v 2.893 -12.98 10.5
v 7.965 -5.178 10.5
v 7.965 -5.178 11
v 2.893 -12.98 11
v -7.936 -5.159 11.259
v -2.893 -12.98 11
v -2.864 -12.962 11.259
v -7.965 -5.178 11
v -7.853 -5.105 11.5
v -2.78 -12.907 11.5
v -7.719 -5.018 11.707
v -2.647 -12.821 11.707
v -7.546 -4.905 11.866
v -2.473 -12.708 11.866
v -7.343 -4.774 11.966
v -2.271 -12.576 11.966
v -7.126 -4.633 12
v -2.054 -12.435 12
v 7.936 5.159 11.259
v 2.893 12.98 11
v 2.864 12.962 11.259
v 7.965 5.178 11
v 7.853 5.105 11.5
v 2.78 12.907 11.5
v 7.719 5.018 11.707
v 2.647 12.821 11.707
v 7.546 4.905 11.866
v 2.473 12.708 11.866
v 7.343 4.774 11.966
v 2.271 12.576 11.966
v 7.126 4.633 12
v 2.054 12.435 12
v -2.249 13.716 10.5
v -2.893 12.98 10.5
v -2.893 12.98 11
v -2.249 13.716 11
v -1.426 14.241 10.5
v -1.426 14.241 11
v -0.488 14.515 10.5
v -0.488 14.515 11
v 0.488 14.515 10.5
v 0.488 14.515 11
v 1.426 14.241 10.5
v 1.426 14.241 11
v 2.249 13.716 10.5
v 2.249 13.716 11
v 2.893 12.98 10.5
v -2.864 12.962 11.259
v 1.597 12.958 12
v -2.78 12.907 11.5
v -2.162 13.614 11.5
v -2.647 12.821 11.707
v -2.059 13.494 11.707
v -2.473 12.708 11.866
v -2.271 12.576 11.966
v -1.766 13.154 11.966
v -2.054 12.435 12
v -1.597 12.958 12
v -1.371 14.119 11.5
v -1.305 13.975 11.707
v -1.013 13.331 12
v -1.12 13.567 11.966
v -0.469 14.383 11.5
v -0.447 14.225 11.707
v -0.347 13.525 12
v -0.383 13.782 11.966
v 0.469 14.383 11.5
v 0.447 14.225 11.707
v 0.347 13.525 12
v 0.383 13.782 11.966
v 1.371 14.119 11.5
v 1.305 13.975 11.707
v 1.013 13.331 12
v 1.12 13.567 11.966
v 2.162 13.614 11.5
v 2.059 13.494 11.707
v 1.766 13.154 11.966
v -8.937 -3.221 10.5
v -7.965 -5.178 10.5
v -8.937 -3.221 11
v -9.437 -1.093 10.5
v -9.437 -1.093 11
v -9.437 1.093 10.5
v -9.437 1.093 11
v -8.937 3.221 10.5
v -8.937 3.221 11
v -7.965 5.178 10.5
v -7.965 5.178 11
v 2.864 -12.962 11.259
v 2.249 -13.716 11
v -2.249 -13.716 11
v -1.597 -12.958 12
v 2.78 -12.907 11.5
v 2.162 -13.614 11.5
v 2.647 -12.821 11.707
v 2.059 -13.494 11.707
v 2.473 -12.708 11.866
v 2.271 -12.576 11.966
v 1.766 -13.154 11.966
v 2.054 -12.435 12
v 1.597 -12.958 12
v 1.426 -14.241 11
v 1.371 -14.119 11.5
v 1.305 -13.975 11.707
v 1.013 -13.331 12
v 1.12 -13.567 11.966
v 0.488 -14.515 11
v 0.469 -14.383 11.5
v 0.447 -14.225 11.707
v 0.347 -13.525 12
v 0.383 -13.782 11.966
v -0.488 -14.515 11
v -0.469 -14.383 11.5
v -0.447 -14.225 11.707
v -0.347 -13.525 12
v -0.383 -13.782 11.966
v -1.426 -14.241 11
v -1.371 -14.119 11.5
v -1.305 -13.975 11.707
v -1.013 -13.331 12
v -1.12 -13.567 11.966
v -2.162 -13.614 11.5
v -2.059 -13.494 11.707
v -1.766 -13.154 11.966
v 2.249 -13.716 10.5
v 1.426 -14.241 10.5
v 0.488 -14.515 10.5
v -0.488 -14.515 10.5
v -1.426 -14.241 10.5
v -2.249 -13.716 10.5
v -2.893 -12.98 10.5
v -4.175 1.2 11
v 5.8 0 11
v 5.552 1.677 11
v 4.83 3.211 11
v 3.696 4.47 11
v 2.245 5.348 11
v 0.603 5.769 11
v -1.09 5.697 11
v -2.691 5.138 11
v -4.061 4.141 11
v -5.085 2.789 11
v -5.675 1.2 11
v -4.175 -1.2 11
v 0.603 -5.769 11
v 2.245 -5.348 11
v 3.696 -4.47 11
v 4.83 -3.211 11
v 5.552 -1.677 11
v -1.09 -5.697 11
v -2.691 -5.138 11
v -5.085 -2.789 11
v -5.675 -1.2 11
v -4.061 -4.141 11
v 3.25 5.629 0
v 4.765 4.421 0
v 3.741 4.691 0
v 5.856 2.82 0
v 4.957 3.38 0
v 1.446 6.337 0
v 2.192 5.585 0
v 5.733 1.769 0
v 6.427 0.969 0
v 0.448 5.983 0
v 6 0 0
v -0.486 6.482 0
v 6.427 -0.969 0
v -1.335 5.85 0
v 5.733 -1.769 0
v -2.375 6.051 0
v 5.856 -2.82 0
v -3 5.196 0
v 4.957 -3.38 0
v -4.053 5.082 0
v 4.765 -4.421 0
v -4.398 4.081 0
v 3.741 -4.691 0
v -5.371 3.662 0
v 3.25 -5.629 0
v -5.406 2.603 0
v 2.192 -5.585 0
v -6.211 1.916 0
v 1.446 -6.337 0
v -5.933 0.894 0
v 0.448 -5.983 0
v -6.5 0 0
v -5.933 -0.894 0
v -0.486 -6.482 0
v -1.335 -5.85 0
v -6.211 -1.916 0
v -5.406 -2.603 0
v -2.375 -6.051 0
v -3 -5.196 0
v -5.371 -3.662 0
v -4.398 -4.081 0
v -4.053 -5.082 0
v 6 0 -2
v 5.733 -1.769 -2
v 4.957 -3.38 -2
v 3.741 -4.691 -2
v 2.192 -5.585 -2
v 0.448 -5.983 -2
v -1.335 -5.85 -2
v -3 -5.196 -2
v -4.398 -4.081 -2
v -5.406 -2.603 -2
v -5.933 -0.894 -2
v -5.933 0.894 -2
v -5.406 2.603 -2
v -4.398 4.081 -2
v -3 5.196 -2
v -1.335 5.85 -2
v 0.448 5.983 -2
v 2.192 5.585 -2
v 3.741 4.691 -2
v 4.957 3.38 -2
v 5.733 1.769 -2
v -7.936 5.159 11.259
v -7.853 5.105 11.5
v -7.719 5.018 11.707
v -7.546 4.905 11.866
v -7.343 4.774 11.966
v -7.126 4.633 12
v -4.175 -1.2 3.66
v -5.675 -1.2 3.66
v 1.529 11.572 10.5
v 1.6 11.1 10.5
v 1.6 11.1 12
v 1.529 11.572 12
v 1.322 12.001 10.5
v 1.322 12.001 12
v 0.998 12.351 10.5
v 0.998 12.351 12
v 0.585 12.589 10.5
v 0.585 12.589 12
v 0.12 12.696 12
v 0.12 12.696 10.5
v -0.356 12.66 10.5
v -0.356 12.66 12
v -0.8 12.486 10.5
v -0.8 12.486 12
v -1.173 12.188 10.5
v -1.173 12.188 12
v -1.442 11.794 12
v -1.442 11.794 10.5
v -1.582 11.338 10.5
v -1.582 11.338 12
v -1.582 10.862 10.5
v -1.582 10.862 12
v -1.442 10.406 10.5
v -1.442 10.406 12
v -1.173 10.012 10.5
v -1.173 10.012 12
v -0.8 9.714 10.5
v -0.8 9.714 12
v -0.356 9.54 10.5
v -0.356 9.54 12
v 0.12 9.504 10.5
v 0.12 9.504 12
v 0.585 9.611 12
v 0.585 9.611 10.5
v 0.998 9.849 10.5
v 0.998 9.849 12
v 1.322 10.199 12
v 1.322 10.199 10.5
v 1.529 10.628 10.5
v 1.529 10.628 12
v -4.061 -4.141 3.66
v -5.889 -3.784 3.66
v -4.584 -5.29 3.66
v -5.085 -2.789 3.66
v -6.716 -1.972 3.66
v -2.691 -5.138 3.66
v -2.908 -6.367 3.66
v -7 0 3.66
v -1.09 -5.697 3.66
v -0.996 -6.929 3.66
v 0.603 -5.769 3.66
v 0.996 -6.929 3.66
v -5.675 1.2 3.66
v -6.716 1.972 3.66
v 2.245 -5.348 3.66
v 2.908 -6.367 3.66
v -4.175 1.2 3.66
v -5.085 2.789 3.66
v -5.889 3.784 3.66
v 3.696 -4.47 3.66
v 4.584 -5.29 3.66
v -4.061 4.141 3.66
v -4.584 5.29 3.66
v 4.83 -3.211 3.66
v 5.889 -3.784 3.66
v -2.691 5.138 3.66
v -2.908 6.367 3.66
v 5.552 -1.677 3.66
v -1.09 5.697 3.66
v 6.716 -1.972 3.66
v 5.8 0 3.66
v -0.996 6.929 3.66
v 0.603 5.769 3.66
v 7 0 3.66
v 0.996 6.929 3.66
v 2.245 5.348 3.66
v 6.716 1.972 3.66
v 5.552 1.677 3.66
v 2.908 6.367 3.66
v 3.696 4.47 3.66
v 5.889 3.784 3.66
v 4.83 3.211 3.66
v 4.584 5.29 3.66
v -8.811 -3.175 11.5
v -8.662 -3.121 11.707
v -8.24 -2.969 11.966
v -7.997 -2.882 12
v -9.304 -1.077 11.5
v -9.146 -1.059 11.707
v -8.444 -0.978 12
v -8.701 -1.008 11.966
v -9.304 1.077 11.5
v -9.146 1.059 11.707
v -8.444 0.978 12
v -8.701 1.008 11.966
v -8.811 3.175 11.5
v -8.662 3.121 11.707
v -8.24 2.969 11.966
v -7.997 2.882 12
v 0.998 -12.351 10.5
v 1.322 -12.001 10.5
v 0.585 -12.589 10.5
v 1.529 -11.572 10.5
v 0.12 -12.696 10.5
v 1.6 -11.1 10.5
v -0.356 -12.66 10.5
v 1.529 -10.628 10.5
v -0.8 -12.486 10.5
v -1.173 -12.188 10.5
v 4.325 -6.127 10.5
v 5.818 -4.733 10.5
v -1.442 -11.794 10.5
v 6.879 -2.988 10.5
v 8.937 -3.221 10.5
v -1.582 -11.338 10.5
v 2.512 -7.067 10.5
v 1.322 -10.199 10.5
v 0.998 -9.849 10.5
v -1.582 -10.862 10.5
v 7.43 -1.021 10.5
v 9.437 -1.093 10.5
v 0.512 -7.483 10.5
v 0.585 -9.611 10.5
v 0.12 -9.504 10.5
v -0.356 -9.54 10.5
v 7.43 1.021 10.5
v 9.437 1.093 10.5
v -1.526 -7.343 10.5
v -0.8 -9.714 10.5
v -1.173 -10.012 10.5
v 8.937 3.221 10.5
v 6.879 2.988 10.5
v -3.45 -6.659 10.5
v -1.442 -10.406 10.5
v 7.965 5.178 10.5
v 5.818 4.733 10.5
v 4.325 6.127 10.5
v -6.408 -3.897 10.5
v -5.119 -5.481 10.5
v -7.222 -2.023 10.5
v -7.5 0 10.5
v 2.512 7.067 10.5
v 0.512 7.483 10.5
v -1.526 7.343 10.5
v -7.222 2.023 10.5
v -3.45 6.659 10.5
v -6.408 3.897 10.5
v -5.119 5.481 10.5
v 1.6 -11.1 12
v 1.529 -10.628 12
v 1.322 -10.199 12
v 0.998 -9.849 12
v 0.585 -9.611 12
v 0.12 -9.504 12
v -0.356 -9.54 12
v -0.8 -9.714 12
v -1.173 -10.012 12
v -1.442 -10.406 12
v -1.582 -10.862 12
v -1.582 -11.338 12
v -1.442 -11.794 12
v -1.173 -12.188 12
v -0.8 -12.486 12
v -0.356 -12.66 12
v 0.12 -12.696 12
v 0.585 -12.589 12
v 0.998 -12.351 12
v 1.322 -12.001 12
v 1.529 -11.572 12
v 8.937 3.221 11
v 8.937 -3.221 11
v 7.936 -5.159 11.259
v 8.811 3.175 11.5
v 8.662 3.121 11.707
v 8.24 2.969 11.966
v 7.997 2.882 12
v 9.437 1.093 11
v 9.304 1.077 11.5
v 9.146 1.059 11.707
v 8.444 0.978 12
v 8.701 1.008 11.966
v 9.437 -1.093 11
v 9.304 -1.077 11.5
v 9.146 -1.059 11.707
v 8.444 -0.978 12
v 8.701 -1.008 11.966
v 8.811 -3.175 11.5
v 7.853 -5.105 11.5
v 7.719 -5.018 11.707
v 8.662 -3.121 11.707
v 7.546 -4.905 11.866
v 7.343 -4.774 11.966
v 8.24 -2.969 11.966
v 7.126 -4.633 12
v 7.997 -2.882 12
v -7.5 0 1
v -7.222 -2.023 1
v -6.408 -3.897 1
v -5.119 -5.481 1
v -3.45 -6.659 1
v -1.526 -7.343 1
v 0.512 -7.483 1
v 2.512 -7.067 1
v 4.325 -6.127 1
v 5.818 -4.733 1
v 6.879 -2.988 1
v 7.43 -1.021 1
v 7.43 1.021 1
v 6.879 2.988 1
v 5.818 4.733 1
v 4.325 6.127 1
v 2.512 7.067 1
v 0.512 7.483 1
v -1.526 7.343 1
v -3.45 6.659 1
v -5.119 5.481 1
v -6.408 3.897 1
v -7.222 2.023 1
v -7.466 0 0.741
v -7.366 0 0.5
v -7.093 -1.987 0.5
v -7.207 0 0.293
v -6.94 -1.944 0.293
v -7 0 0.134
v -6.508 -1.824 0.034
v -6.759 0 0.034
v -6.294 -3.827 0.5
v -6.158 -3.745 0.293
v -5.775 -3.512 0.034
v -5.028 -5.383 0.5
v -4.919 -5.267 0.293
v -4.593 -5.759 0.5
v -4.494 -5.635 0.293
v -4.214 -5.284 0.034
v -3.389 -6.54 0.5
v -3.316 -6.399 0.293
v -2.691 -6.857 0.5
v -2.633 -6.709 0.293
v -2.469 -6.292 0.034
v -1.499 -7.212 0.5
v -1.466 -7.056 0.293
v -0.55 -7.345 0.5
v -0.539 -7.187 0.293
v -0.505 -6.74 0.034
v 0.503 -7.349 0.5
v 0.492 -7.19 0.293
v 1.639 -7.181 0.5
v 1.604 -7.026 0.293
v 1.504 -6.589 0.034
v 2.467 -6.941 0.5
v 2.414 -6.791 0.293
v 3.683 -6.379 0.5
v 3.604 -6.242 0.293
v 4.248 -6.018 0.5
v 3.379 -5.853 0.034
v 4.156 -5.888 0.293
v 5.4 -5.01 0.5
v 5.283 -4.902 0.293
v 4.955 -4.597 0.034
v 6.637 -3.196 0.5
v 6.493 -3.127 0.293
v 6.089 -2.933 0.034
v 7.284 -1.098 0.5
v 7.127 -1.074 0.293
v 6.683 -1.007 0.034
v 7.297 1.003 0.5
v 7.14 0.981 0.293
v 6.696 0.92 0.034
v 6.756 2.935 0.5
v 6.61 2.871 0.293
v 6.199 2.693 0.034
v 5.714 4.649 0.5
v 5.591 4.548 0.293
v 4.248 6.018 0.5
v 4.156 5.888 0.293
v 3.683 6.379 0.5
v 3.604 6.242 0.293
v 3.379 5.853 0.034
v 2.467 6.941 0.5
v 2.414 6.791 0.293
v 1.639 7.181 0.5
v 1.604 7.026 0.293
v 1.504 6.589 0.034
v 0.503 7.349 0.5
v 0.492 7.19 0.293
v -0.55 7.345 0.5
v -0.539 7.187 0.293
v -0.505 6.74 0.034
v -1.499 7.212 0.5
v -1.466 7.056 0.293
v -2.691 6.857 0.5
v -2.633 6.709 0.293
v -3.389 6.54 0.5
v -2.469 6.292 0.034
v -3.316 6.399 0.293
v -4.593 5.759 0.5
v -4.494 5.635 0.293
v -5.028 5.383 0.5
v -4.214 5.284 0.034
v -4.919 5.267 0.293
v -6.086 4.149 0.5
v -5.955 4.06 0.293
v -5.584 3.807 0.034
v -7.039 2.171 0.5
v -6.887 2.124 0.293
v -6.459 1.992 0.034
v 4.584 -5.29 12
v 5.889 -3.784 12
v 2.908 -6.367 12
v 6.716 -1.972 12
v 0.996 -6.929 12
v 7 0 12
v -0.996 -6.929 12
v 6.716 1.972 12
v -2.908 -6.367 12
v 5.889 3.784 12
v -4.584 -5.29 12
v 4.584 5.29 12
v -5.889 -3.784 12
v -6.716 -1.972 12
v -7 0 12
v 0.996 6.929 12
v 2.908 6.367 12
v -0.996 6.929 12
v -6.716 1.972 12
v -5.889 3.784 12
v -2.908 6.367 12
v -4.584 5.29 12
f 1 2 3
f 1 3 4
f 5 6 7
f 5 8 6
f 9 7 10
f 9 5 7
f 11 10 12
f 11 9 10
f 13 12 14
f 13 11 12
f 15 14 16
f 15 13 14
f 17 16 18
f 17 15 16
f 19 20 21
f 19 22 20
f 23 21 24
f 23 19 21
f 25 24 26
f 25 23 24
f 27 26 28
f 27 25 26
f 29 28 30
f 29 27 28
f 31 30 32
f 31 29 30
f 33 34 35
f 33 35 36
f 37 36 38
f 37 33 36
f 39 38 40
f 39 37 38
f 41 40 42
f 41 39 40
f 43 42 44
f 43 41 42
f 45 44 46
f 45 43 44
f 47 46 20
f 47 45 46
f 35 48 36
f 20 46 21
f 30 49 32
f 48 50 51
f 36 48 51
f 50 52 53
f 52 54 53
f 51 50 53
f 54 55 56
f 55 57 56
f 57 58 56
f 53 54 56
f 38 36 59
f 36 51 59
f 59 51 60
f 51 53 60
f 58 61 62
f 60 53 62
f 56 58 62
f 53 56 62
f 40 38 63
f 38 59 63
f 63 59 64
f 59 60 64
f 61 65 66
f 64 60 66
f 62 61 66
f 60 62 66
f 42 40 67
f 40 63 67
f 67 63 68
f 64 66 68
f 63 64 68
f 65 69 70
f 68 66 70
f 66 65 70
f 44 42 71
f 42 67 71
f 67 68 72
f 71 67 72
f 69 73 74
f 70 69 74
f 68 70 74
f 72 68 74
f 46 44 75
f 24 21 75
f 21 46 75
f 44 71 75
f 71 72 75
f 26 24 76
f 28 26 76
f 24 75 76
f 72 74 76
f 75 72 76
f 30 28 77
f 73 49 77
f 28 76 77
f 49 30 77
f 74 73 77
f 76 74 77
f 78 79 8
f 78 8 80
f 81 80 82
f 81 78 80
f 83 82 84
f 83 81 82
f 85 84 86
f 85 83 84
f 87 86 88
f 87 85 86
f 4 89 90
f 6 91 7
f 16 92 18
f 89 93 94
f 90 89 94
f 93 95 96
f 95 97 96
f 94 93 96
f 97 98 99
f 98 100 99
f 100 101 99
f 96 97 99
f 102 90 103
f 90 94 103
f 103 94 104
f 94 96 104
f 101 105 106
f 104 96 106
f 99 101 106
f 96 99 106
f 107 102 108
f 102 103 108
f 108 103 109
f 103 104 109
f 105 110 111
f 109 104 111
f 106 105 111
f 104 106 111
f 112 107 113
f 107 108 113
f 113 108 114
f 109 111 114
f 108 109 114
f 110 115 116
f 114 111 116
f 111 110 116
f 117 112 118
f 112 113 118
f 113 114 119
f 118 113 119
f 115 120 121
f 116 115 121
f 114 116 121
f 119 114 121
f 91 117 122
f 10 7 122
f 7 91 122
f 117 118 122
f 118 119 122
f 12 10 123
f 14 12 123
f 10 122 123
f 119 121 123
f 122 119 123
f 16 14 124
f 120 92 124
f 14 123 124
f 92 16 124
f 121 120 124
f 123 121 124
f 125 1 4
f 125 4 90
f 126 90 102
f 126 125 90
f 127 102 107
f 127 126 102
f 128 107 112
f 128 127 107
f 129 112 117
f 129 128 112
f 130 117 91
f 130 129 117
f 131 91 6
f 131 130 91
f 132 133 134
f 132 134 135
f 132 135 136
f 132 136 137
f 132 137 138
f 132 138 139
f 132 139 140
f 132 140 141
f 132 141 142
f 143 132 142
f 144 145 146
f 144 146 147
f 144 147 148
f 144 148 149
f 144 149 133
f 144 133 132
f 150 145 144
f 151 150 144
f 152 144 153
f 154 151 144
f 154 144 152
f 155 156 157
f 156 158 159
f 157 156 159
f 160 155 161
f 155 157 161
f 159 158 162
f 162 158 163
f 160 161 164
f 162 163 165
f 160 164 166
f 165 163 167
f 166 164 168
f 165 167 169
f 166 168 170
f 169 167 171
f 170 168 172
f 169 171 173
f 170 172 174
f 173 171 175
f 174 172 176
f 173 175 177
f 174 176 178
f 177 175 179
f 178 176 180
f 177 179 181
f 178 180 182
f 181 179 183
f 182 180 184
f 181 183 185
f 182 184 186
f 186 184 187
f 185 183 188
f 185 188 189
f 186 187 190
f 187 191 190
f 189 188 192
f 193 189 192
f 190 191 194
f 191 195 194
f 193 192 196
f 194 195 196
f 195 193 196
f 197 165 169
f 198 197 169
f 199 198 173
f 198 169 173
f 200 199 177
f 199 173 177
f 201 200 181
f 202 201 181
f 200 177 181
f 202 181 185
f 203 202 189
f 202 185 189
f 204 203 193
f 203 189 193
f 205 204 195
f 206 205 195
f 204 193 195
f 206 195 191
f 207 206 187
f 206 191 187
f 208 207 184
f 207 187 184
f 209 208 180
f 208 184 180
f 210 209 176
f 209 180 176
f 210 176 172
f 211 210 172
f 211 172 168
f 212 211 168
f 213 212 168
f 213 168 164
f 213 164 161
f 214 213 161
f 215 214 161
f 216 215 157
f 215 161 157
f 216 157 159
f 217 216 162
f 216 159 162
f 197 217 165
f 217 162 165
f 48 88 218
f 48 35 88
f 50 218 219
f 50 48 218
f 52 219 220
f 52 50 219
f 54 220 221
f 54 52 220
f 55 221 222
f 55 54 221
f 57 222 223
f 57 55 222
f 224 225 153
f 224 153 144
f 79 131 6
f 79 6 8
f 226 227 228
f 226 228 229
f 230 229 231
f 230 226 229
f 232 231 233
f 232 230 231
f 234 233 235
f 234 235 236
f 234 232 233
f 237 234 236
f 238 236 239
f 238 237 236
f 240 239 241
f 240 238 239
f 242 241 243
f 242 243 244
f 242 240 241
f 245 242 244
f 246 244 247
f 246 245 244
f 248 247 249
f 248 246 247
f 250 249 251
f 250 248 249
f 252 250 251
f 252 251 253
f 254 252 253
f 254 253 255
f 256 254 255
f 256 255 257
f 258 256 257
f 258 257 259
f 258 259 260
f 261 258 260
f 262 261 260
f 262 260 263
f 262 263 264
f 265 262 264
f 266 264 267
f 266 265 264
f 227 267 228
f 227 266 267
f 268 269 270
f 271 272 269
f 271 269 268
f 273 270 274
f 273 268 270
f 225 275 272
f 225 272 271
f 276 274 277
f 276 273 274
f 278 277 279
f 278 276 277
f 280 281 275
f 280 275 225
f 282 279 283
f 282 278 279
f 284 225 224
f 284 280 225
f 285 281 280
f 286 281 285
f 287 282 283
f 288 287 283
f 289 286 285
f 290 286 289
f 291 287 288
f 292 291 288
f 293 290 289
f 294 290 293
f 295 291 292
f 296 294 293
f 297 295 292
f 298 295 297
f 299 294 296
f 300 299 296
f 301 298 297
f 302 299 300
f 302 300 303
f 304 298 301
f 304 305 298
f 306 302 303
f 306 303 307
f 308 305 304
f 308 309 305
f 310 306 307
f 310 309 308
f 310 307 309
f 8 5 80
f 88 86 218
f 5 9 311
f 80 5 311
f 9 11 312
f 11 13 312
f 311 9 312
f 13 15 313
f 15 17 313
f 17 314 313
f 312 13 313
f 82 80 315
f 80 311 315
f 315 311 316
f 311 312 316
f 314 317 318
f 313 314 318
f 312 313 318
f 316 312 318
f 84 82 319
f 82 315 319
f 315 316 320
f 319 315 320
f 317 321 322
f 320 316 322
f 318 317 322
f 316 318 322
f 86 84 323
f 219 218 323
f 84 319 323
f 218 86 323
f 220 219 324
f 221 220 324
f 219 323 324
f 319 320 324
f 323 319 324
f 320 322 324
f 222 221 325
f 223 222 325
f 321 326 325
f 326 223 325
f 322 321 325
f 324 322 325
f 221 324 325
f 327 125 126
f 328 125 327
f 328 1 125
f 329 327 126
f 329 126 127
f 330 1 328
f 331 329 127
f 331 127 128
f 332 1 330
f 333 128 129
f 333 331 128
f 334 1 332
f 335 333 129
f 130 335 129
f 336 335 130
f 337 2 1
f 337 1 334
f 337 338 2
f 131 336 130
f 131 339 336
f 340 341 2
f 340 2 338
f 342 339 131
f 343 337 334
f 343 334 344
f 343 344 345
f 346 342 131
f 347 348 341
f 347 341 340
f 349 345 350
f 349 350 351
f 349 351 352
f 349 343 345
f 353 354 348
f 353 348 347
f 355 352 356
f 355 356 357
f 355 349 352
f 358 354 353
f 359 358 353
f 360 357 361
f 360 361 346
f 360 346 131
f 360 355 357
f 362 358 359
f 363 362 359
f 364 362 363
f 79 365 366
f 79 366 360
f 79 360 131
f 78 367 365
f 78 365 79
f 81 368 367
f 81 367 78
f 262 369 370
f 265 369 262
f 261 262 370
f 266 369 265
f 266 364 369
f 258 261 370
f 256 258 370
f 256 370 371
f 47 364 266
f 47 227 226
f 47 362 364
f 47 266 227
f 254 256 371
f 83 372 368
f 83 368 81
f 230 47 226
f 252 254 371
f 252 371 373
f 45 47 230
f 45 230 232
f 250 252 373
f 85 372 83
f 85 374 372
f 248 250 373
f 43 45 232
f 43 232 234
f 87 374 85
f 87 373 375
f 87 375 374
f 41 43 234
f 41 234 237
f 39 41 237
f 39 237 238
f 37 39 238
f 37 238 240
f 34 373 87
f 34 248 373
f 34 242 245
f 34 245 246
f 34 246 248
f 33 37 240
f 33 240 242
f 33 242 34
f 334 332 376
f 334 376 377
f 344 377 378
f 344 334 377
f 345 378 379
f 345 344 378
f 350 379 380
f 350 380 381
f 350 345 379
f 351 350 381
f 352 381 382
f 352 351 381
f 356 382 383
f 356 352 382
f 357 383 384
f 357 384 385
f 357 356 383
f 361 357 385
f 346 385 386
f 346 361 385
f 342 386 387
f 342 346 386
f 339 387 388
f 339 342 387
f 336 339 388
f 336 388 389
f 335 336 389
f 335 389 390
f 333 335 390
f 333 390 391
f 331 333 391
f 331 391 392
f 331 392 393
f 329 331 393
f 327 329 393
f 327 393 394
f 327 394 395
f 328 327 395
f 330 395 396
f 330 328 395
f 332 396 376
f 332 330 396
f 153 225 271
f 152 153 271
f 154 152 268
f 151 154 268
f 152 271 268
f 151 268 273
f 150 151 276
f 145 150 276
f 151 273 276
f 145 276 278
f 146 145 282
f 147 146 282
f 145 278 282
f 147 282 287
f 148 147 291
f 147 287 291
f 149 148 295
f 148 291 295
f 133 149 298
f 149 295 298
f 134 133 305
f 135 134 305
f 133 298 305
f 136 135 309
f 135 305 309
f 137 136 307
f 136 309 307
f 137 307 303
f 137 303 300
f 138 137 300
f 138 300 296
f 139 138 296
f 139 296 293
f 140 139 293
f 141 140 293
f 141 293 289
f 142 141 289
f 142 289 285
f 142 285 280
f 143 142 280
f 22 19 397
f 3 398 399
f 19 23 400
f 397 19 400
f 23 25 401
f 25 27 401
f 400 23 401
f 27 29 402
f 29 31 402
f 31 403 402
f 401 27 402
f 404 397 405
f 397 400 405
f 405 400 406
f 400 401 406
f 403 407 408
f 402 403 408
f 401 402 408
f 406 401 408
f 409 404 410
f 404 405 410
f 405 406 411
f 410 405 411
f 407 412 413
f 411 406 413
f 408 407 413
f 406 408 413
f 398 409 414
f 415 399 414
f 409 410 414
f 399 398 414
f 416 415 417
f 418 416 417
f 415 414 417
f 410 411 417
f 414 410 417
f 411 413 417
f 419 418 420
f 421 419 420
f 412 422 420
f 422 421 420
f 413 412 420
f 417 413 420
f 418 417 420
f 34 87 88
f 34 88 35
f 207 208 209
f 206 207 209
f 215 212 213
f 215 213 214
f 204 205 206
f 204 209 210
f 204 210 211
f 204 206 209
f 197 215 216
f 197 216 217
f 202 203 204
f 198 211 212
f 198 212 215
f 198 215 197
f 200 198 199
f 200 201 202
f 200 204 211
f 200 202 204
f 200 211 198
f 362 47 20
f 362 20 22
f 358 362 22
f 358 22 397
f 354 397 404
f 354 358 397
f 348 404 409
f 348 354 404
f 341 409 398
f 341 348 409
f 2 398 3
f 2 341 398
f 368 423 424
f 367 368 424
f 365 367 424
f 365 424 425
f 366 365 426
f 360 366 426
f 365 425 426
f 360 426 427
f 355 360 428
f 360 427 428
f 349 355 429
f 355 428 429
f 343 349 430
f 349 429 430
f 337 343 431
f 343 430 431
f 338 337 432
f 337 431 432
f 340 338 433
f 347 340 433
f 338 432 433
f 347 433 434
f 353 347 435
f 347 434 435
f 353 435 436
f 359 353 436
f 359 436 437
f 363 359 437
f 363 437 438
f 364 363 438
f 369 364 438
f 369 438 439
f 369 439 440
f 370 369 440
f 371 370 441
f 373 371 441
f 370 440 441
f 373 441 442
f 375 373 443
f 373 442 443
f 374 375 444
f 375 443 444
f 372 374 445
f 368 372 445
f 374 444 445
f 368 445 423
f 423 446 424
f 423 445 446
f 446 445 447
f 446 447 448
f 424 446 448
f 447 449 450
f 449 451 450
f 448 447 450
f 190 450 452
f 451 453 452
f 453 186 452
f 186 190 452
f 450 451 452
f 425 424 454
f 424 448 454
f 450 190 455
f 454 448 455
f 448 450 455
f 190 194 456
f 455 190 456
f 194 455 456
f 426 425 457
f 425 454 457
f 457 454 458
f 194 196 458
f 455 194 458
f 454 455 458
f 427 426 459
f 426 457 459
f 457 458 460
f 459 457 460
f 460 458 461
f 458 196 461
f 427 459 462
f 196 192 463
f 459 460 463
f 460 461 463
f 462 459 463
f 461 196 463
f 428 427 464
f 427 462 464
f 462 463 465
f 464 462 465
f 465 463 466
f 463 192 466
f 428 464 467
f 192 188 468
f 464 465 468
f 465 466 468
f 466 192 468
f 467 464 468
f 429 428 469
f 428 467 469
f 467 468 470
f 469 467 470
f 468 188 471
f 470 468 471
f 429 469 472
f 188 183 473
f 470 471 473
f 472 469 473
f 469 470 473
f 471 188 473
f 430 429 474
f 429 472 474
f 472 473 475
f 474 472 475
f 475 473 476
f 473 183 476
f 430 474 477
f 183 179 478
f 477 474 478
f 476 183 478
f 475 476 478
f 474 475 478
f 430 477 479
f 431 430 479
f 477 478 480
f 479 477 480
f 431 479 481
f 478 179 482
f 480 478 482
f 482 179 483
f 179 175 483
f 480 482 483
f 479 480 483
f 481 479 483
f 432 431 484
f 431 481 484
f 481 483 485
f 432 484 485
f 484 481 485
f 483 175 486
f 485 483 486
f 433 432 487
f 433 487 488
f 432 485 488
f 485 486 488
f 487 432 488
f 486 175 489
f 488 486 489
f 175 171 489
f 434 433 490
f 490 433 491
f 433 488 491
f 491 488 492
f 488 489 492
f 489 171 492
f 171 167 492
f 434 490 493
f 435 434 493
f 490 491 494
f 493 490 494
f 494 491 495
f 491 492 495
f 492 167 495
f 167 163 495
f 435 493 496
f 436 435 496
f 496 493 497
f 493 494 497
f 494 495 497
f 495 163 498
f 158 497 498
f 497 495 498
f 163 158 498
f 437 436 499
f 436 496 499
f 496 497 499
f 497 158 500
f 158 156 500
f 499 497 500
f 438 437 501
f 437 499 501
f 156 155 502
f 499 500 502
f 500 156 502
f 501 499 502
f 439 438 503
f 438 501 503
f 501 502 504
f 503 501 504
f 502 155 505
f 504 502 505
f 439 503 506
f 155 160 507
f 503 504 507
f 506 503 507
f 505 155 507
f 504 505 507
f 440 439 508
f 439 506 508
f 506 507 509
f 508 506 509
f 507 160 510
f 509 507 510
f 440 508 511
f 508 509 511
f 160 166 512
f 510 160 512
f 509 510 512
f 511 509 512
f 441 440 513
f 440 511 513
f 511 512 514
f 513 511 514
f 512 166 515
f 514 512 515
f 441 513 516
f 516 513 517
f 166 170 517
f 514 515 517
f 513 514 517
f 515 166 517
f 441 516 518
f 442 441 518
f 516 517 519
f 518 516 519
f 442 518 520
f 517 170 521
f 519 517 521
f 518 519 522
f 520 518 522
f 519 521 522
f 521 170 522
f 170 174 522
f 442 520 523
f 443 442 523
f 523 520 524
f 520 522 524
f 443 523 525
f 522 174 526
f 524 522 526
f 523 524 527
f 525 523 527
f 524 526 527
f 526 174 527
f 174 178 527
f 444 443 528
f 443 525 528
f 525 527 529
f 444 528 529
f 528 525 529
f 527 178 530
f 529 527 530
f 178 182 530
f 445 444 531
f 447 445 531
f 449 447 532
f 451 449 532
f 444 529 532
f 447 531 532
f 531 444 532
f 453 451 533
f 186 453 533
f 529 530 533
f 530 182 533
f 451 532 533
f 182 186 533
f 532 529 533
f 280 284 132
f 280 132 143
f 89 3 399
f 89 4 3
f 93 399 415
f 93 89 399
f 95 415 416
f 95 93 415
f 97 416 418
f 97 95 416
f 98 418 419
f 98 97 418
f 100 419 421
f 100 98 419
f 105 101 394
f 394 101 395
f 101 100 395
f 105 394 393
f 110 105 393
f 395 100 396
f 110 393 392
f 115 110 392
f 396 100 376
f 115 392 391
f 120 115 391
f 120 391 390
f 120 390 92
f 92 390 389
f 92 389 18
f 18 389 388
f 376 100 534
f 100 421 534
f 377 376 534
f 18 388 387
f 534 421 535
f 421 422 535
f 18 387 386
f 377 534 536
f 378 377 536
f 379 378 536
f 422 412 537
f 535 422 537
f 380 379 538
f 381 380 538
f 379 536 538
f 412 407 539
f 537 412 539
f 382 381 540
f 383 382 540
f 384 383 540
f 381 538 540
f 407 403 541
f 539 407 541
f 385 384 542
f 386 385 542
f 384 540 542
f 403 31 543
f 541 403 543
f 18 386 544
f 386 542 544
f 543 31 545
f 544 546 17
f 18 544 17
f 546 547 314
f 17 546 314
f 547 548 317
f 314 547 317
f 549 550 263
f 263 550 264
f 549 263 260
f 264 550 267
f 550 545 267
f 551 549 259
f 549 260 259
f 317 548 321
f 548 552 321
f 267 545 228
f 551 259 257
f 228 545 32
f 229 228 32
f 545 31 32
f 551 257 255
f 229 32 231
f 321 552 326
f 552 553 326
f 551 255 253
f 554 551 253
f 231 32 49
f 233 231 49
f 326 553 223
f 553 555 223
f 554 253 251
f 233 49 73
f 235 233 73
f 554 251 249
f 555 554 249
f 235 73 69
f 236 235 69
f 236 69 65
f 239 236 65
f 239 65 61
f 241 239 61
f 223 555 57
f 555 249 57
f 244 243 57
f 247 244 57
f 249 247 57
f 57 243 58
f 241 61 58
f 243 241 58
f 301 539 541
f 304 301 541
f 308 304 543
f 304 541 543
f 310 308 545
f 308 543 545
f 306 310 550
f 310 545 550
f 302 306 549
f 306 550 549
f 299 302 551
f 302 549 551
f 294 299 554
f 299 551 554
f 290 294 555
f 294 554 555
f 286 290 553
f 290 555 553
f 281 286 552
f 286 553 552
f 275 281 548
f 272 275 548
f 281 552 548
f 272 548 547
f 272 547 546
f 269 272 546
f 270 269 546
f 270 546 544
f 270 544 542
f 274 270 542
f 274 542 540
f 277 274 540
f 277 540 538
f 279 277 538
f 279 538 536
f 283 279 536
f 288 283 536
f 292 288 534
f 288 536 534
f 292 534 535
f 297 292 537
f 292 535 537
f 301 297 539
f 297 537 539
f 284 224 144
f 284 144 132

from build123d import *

# Parameters (mm, degrees)
SKETCH1_R           = 7.5
BOSS_EXTRUDE1_DEPTH = 10.5
FILLET1_R           = 1
SKETCH2_R           = 6
BOSS_EXTRUDE2_DEPTH = 2
SKETCH3_R           = 1.6
BOSS_EXTRUDE3_DEPTH = 1.5
FILLET2_R           = 1
SKETCH4_R           = 7
CUT_EXTRUDE1_DEPTH  = 8.34
SKETCH5_R           = 5.8
BOSS_EXTRUDE4_DEPTH = 7.34
CUT_EXTRUDE2_START  = -7.34
CUT_EXTRUDE2_DEPTH  = 7.34


with BuildPart() as part:
    # Sketch1 → Boss-Extrude1 (new body)
    with BuildSketch(Plane.XY):
        with Locations(Location((0, 0, 0), (0, 0, 180))):
            Circle(SKETCH1_R)
    extrude(amount=BOSS_EXTRUDE1_DEPTH)

    # Fillet1
    fillet1_edges = [part.edges().sort_by_distance(p)[0] for p in [
        (7.5, 0, 0),
    ]]
    fillet(fillet1_edges, radius=FILLET1_R)

    # Sketch2 → Boss-Extrude2 (add)
    with BuildSketch(Plane(origin=(0, 0, 0), x_dir=(-1, 0, 0), z_dir=(0, 0, -1))):
        with Locations(Location((0, 0, 0), (0, 0, 180))):
            Circle(SKETCH2_R)
    extrude(amount=BOSS_EXTRUDE2_DEPTH)

    # Sketch3 → Boss-Extrude3 (add)
    with BuildSketch(Plane.XY.offset(10.5)):
        with BuildLine():
            Line((-7.964864241, 5.177927928), (-2.89250333, 12.980405405))
            ThreePointArc((-2.89250333, 12.980405405), (0, 14.55), (2.89250333, 12.980405405))
            Line((2.89250333, 12.980405405), (7.964864241, 5.177927928))
            ThreePointArc((7.964864241, 5.177927928), (9.5, 0), (7.964864241, -5.177927928))
            Line((7.964864241, -5.177927928), (2.89250333, -12.980405405))
            ThreePointArc((2.89250333, -12.980405405), (0, -14.55), (-2.89250333, -12.980405405))
            Line((-2.89250333, -12.980405405), (-7.964864241, -5.177927928))
            ThreePointArc((-7.964864241, -5.177927928), (-9.5, 0), (-7.964864241, 5.177927928))
        make_face()
        with Locations((0, -11.1)):
            Circle(SKETCH3_R, mode=Mode.SUBTRACT)
        with Locations((0, 11.1)):
            Circle(SKETCH3_R, mode=Mode.SUBTRACT)
    extrude(amount=BOSS_EXTRUDE3_DEPTH)

    # Fillet2
    fillet2_edges = [part.edges().sort_by_distance(p)[0] for p in [
        (-9.5, 0, 12),
        (-5.428683785, -9.079166667, 12),
        (0, -14.55, 12),
        (5.428683785, -9.079166667, 12),
        (9.5, 0, 12),
        (5.428683785, 9.079166667, 12),
        (0, 14.55, 12),
        (-5.428683785, 9.079166667, 12),
    ]]
    fillet(fillet2_edges, radius=FILLET2_R)

    # Sketch4 → Cut-Extrude1 (cut)
    with BuildSketch(Plane.XY.offset(12)):
        Circle(SKETCH4_R)
    extrude(amount=-CUT_EXTRUDE1_DEPTH, mode=Mode.SUBTRACT)

    # Sketch5 → Boss-Extrude4 (add)
    with BuildSketch(Plane.XY.offset(3.66)):
        with Locations(Location((0, 0, 0), (0, 0, 180))):
            Circle(SKETCH5_R)
    extrude(amount=BOSS_EXTRUDE4_DEPTH)

    # Sketch6 → Cut-Extrude2 (cut)
    with BuildSketch(Plane.XY.offset(11).offset(CUT_EXTRUDE2_START)):
        with BuildLine():
            Line((-5.674504384, -1.2), (-4.174504384, -1.2))
            Line((-4.174504384, -1.2), (-4.174504384, 1.2))
            Line((-4.174504384, 1.2), (-5.674504384, 1.2))
            ThreePointArc((-5.674504384, 1.2), (-5.8, 0), (-5.674504384, -1.2))
        make_face()
    extrude(amount=CUT_EXTRUDE2_DEPTH, mode=Mode.SUBTRACT)


solid = part.part
